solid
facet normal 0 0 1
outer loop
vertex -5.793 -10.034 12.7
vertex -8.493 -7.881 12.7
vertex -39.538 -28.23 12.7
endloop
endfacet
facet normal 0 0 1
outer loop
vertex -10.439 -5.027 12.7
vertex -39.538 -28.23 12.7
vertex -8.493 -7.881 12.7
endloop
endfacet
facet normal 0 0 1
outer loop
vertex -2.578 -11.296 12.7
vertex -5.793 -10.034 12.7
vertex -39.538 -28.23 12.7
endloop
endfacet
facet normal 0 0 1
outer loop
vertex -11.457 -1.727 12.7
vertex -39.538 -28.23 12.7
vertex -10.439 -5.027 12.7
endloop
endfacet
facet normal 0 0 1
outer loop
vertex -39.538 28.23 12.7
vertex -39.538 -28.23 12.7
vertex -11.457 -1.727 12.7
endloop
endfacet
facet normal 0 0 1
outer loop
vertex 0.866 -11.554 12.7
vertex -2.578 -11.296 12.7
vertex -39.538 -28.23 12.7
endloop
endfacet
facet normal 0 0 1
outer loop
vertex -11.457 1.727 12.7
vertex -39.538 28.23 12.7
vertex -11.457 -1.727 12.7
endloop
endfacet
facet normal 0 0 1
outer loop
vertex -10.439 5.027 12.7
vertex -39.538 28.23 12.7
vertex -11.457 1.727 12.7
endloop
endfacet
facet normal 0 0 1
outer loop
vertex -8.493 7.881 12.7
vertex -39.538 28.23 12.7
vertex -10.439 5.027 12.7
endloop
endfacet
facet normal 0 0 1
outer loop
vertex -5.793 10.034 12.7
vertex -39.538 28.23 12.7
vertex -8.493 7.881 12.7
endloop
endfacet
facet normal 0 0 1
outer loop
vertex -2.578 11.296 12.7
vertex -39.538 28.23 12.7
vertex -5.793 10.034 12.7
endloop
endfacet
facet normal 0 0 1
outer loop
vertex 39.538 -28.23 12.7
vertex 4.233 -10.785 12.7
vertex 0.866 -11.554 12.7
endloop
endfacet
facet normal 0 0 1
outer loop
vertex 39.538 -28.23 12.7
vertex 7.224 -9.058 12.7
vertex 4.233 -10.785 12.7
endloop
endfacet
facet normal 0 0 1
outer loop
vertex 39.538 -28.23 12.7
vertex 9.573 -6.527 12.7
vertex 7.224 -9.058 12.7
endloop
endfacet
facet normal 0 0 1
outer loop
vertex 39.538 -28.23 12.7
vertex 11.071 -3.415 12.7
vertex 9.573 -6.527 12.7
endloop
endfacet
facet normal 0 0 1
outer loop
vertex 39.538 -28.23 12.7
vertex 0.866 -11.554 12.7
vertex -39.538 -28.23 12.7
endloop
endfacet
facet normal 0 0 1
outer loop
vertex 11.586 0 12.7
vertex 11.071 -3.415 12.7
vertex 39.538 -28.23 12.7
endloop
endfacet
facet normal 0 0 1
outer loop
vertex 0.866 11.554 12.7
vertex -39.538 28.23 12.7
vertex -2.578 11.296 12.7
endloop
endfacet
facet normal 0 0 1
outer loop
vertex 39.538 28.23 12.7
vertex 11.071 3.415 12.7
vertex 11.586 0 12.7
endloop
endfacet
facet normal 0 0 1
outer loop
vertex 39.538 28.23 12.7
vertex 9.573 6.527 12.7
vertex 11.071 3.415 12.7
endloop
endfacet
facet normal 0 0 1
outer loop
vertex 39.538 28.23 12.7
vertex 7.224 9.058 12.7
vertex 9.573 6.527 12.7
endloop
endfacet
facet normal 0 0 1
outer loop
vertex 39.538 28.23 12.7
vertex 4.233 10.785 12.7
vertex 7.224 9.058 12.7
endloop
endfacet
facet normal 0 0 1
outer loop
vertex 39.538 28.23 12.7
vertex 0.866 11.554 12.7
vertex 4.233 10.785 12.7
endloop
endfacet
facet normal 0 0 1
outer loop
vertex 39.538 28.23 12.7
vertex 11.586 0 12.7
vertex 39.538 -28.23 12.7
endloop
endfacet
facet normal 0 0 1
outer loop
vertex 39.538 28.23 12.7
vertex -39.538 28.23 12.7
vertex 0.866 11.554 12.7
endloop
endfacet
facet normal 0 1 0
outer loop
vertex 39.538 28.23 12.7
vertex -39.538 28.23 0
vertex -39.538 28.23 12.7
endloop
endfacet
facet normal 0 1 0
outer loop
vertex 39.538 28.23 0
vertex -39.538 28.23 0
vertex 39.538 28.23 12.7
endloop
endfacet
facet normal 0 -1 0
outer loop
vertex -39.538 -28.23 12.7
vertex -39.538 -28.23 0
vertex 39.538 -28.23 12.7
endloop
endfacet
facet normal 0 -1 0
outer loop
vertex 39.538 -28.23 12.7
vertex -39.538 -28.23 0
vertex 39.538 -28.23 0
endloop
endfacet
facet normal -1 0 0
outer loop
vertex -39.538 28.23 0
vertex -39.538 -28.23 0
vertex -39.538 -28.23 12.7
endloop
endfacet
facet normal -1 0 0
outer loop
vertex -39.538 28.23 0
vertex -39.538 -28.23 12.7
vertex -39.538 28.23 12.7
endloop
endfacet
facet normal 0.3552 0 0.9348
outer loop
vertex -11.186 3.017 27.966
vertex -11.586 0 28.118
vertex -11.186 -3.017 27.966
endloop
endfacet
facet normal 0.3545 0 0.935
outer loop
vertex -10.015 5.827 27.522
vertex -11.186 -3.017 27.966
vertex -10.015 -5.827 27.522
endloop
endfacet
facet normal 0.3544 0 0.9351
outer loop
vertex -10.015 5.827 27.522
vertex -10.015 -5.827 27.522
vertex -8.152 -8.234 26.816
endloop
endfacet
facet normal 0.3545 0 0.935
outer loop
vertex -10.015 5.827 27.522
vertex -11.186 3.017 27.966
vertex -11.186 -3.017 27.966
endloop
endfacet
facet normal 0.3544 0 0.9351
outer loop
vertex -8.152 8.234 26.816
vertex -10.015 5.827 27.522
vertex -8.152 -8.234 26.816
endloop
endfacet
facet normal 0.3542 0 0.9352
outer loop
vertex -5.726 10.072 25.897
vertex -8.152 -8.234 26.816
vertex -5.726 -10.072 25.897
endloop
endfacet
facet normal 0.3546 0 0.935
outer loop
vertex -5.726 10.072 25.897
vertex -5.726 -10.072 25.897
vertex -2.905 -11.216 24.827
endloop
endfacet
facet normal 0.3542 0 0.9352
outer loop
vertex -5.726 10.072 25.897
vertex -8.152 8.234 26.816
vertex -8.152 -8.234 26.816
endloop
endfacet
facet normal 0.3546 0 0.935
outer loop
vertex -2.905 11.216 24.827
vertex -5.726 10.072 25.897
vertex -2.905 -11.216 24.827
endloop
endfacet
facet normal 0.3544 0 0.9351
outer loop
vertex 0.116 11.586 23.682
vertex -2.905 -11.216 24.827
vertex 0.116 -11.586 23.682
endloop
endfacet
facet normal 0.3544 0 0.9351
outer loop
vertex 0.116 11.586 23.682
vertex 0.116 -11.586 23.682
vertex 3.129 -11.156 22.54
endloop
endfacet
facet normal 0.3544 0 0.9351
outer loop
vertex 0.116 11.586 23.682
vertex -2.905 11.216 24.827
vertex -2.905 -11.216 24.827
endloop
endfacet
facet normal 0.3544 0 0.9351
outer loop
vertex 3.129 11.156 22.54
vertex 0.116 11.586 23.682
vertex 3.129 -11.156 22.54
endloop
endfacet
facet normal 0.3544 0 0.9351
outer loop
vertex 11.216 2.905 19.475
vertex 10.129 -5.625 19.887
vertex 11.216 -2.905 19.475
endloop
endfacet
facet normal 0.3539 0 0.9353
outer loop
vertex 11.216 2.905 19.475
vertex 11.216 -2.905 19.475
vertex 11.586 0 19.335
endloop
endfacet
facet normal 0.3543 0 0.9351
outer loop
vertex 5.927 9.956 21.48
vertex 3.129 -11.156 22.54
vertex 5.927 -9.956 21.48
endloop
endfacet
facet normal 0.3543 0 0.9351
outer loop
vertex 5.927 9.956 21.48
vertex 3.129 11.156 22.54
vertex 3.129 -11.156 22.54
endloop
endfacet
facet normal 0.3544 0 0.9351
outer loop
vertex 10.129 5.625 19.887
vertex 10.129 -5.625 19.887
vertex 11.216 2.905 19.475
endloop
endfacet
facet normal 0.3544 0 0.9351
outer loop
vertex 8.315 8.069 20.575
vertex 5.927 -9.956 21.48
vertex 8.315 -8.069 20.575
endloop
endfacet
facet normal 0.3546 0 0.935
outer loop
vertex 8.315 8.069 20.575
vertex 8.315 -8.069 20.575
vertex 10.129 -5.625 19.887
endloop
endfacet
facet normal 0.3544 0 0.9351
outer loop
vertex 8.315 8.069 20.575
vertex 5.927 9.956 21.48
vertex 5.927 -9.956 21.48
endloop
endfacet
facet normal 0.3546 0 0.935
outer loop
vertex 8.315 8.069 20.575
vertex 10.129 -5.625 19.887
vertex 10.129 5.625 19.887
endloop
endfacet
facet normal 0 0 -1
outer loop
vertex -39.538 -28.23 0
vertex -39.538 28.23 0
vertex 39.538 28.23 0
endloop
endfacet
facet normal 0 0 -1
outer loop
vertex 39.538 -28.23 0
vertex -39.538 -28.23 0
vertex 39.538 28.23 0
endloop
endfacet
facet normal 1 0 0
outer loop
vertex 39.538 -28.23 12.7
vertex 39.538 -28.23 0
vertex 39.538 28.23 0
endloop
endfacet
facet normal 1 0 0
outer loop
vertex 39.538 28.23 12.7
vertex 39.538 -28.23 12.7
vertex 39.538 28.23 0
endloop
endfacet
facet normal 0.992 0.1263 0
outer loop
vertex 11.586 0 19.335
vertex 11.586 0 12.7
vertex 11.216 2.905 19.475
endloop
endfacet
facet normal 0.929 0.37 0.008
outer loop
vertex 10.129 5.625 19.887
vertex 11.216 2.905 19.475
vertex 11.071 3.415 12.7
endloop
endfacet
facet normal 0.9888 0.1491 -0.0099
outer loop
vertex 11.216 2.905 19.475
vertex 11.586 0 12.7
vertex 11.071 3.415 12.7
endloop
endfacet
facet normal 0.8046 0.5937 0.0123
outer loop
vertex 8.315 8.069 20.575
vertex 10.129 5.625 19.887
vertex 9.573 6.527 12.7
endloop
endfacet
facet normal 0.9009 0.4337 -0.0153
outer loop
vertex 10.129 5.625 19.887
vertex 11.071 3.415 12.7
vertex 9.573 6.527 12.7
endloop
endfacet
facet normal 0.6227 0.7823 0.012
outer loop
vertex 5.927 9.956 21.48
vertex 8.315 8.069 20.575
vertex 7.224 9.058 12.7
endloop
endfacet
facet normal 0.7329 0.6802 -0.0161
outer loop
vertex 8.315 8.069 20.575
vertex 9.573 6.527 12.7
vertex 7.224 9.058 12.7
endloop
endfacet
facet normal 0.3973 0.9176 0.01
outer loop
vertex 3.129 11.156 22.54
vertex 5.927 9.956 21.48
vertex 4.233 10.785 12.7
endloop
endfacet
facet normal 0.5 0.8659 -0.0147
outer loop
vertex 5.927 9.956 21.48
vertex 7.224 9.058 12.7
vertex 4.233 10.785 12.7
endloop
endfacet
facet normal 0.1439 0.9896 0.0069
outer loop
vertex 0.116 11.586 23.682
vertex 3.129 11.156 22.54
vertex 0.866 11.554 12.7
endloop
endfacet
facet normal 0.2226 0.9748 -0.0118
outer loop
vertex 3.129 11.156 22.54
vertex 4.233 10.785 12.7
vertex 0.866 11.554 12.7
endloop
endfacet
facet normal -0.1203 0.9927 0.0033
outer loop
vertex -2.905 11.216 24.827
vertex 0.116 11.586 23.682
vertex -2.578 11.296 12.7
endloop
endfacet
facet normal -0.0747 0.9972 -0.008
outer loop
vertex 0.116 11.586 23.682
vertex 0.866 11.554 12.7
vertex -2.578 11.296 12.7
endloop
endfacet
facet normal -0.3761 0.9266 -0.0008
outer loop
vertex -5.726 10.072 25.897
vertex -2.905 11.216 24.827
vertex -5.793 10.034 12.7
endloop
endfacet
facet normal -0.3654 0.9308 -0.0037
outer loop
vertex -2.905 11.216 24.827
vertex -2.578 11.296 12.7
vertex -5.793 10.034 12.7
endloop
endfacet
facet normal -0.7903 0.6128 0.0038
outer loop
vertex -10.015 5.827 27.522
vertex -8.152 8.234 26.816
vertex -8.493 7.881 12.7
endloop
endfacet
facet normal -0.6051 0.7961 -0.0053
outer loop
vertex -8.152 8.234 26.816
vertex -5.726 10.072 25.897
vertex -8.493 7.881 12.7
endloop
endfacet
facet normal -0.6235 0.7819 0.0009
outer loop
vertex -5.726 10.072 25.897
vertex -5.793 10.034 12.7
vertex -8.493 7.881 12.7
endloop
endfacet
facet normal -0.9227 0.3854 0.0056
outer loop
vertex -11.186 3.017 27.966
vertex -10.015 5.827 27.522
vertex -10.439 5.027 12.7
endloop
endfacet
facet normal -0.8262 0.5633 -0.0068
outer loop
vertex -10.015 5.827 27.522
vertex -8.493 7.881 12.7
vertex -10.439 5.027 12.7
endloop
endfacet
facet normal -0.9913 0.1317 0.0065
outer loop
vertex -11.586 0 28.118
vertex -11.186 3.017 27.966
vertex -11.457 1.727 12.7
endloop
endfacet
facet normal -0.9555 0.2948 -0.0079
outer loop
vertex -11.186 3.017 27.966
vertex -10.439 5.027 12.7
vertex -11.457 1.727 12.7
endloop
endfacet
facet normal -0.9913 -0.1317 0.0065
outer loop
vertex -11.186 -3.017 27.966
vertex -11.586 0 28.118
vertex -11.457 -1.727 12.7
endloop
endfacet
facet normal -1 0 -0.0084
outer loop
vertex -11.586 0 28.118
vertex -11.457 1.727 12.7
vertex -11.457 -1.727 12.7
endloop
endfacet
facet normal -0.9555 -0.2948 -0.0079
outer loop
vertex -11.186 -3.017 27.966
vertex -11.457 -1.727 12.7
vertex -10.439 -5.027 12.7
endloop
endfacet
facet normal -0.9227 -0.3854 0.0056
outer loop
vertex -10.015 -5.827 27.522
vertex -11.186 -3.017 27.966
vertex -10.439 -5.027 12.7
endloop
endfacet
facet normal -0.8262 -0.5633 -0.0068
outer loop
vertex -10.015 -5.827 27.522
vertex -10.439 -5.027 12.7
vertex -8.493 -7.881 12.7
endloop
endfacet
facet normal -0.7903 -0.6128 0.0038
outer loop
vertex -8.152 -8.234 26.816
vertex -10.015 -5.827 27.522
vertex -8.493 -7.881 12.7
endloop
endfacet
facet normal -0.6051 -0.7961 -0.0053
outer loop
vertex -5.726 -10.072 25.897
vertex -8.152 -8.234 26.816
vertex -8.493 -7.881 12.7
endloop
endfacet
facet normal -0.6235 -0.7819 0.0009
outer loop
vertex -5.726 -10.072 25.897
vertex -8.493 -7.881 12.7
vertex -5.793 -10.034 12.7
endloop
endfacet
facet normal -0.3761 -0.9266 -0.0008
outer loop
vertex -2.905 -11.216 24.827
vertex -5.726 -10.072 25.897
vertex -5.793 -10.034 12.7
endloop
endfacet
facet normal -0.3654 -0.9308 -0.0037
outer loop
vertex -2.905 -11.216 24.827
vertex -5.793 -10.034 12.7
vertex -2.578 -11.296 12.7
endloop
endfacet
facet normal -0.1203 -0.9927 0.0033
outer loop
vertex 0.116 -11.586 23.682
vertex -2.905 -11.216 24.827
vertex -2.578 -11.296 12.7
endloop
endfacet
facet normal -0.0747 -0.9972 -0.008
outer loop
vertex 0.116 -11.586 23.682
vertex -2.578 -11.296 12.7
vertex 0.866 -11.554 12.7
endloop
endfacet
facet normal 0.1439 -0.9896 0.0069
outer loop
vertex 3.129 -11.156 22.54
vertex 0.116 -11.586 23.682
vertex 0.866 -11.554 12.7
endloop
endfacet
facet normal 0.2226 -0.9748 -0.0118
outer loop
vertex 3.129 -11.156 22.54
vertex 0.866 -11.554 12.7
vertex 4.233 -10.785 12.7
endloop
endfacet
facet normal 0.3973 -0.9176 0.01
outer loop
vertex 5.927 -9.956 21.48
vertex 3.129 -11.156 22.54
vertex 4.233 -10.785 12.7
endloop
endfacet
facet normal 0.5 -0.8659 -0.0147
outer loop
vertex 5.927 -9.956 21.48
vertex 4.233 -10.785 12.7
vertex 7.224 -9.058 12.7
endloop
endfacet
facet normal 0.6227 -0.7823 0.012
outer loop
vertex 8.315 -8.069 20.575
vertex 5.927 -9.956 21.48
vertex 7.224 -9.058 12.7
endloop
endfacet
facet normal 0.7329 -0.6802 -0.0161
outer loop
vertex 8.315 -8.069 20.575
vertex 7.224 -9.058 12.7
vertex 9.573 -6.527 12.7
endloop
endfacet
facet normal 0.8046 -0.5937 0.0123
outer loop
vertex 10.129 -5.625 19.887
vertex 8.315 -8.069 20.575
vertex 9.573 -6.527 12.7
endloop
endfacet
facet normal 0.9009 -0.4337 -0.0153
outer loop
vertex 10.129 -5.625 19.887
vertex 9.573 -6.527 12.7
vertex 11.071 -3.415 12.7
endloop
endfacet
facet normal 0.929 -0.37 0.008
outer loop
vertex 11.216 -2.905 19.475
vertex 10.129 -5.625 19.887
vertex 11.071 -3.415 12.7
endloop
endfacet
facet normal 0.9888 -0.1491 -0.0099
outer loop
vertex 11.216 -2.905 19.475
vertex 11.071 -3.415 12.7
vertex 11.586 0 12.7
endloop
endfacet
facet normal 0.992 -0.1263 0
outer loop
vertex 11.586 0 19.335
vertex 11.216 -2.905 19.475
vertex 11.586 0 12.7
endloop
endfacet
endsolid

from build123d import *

# Parameters (mm, degrees)
F0_W     = 79.076722
F0_H     = 56.460418
F1_DEPTH = 12.7
F2_R     = 11.586166
F3_DEPTH = 23.368
F5_DEPTH = 20.828
F6_DEPTH = 37.338


with BuildPart() as f1:
    # F0 (on Top) → F1 (new body)
    with BuildSketch(Plane.XY):
        Rectangle(F0_W, F0_H)
    extrude(amount=F1_DEPTH)

    # F2 (on face) → F3 (join)
    with BuildSketch(Plane.XY.offset(12.7)):
        Circle(F2_R)
    extrude(amount=F3_DEPTH)

    # F4 (on Front) → F5 (cut)
    with BuildSketch(Plane.XZ):
        Polygon((-16.648348, 45.342267), (-16.648348, 30.036526), (12.731089, 18.900771), (12.731089, 45.342267), align=None)
    extrude(amount=-F5_DEPTH, mode=Mode.SUBTRACT)

    # F4 (on Front) → F6 (cut)
    with BuildSketch(Plane.XZ):
        Polygon((-16.648348, 45.342267), (-16.648348, 30.036526), (12.731089, 18.900771), (12.731089, 45.342267), align=None)
    extrude(amount=F6_DEPTH, mode=Mode.SUBTRACT)


solid = f1.part
